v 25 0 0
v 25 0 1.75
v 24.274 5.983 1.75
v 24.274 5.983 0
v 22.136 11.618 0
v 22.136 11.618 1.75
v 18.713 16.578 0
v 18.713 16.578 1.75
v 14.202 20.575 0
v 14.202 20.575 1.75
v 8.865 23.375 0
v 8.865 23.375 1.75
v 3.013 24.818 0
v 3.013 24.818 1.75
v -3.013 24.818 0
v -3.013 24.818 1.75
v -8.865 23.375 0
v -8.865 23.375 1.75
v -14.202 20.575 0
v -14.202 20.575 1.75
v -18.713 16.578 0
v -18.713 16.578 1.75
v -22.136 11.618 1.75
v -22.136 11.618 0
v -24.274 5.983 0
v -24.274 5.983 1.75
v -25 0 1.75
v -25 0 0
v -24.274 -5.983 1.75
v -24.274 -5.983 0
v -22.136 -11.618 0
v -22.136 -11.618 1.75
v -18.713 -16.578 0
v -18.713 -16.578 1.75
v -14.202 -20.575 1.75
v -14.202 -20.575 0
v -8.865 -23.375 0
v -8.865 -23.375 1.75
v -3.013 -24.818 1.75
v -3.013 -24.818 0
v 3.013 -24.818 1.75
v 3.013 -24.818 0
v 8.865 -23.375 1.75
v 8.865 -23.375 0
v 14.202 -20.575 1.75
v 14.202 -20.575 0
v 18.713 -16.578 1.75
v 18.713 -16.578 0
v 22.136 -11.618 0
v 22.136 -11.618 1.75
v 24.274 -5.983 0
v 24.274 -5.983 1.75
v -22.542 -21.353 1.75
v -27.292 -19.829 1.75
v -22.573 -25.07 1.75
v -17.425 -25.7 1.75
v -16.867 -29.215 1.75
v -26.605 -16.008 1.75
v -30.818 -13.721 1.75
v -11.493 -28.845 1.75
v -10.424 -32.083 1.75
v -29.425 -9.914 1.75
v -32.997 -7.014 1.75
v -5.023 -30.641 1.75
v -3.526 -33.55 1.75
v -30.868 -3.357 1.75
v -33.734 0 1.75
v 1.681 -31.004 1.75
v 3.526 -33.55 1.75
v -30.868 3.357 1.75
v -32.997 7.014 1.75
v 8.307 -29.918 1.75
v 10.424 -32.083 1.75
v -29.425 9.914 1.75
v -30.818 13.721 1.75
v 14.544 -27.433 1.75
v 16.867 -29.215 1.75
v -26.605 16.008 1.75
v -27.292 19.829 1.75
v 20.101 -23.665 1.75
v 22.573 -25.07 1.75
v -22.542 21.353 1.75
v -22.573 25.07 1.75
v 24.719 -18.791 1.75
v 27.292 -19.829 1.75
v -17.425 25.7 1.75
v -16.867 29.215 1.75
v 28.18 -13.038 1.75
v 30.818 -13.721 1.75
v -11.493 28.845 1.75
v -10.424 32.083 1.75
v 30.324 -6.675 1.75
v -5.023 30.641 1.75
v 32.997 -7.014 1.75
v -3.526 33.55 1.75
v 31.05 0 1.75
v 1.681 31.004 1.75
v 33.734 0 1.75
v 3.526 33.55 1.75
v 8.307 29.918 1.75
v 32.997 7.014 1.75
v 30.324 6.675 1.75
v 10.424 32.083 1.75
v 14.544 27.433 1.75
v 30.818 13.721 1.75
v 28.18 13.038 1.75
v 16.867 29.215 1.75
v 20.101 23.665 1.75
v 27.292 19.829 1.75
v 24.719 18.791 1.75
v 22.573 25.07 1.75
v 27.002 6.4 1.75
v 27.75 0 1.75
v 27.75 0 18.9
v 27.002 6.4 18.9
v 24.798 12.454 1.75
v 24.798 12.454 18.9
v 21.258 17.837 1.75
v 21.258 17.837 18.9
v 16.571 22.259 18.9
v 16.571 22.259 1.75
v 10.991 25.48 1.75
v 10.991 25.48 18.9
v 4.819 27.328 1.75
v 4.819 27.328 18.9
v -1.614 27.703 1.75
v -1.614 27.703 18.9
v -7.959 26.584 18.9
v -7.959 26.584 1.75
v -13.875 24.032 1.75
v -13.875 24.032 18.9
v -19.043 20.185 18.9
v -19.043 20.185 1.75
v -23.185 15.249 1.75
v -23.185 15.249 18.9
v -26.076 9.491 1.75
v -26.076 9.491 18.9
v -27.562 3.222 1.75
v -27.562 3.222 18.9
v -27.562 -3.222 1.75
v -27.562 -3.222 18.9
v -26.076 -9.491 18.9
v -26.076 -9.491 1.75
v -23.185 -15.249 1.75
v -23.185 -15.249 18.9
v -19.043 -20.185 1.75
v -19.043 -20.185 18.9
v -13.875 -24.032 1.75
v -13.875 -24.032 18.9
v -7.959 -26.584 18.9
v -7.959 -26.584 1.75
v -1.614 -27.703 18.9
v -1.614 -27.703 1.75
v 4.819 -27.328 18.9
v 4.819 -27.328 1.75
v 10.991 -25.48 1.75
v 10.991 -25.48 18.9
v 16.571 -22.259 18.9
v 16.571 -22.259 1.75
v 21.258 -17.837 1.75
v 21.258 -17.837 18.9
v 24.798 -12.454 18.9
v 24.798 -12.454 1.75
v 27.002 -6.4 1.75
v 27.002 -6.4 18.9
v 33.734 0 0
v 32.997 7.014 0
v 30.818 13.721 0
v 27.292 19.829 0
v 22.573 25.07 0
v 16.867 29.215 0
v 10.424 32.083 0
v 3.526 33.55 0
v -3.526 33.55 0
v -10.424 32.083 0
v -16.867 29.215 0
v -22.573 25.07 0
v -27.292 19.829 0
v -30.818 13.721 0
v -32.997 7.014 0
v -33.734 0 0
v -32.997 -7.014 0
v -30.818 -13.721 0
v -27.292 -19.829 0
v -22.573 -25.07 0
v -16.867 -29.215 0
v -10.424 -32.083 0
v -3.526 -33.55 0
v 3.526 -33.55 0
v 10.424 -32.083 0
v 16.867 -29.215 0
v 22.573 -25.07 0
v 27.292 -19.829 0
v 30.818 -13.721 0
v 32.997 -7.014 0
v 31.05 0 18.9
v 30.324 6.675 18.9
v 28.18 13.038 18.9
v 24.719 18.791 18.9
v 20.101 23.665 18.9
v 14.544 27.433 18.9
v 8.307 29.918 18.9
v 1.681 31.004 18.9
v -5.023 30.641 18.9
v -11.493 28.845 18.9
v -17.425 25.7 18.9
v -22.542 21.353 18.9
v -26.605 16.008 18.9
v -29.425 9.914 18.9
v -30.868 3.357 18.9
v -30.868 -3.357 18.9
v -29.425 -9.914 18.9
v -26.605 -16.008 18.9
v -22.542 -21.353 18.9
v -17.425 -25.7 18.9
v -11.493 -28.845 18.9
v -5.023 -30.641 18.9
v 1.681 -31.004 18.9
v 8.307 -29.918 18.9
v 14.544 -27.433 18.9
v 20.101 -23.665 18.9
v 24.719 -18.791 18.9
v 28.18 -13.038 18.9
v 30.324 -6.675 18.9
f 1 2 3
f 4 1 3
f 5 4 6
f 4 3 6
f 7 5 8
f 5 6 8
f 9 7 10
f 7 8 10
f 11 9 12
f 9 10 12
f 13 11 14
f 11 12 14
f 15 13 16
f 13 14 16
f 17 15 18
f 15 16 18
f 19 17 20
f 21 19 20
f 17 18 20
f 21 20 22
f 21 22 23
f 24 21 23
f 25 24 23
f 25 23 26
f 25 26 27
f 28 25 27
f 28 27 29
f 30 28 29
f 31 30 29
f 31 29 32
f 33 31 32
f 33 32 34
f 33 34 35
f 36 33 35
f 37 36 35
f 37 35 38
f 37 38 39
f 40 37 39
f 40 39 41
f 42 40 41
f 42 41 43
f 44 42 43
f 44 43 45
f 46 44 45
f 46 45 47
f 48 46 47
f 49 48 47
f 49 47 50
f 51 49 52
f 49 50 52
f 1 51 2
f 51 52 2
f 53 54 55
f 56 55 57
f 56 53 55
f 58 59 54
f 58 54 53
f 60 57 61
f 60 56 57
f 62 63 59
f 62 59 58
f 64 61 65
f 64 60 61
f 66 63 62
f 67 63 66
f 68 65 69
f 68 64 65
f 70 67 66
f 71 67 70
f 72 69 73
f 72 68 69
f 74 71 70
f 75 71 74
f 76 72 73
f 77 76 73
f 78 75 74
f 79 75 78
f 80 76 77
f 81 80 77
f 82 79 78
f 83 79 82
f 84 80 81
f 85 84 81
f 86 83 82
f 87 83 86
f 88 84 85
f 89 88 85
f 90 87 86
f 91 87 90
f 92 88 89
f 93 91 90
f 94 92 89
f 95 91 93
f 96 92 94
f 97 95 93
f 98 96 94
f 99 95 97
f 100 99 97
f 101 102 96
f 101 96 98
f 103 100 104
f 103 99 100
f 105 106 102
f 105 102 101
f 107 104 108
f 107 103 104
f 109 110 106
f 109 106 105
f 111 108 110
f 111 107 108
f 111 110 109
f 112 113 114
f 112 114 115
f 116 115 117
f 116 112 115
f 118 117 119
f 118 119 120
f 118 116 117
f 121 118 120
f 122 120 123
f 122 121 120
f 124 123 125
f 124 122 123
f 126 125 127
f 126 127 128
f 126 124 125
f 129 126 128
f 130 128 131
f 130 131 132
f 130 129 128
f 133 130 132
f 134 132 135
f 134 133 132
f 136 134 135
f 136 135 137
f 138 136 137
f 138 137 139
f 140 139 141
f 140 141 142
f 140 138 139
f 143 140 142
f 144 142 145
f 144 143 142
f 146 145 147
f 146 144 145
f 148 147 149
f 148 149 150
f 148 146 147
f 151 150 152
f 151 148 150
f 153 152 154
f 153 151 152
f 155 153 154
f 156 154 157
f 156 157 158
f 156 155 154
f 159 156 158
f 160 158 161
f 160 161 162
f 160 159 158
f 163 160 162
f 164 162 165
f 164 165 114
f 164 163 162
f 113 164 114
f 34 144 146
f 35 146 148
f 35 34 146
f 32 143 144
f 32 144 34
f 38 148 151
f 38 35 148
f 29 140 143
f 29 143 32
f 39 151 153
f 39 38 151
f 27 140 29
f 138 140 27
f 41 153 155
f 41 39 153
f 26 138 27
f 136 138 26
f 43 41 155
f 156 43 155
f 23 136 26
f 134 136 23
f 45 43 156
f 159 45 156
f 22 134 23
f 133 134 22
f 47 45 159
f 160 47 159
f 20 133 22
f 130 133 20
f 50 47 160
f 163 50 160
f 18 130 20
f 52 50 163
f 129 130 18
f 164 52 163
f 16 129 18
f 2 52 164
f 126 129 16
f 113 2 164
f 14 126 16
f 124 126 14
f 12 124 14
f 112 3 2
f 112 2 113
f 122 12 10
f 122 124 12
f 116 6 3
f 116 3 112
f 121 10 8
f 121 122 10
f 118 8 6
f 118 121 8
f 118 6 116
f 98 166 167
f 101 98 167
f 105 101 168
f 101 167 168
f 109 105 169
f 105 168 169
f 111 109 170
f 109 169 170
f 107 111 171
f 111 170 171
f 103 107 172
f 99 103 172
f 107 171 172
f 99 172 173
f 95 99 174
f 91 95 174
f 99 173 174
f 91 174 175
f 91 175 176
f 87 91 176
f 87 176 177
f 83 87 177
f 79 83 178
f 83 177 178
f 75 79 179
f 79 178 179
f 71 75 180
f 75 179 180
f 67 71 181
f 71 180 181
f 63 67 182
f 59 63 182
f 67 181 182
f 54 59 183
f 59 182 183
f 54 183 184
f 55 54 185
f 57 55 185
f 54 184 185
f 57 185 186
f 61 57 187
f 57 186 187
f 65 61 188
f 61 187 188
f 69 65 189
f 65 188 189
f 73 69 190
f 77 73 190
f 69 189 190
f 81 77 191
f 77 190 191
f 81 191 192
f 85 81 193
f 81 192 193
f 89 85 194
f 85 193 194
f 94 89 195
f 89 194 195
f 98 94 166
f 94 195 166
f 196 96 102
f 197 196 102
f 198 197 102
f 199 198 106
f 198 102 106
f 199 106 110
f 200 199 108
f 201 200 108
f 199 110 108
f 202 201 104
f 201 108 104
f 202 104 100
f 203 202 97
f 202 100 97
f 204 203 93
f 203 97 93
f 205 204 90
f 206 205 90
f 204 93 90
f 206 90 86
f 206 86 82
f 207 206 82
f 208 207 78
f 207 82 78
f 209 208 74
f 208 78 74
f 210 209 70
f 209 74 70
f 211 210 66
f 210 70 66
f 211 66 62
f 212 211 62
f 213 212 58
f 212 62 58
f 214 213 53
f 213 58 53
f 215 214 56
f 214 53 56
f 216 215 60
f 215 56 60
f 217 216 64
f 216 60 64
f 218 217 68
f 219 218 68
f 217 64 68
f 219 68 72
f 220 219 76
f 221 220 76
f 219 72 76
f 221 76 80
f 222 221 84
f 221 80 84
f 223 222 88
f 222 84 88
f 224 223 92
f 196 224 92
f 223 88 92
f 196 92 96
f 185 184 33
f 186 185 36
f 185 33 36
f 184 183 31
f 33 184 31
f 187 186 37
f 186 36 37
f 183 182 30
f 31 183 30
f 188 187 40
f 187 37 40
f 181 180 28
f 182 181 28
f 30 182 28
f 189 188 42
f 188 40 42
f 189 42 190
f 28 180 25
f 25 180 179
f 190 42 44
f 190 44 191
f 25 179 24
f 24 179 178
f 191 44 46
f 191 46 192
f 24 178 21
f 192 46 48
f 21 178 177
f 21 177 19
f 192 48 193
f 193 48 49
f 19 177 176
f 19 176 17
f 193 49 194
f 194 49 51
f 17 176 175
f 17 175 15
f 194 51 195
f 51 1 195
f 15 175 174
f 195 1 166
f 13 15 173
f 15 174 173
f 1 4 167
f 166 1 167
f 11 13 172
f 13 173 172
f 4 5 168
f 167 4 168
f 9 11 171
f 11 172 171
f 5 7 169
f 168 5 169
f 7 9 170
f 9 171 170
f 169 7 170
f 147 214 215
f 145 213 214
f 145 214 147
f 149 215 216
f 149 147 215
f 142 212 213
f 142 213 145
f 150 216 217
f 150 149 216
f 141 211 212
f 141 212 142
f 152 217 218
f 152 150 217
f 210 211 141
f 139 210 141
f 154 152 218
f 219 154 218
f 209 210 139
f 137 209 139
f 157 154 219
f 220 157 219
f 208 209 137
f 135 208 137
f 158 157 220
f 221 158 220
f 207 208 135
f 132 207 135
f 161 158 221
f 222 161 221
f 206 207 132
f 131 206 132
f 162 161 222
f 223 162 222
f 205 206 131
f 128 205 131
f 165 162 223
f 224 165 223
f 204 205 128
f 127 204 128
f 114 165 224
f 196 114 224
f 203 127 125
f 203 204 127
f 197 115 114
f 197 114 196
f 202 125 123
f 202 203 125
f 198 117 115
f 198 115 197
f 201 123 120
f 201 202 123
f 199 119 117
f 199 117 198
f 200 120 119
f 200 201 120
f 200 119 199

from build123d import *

# Parameters (mm, degrees)
F0_R     = 33.734375
F1_DEPTH = 1.75
F2_R     = 31.05
F2_R_2   = 27.75
F3_DEPTH = 17.15
F2_R_3   = 25
F4_DEPTH = 1.751


with BuildPart() as f1:
    # F0 (on Top) → F1 (new body)
    with BuildSketch(Plane.XY):
        Circle(F0_R)
    extrude(amount=F1_DEPTH)

    # F2 (on face) → F3 (join)
    with BuildSketch(Plane.XY.offset(1.75)):
        Circle(F2_R)
        Circle(F2_R_2, mode=Mode.SUBTRACT)
    extrude(amount=F3_DEPTH)

    # F2 (on face) → F4 (cut, through all)
    with BuildSketch(Plane.XY.offset(1.75)):
        Circle(F2_R_3)
    extrude(amount=-F4_DEPTH, mode=Mode.SUBTRACT)


solid = f1.part
